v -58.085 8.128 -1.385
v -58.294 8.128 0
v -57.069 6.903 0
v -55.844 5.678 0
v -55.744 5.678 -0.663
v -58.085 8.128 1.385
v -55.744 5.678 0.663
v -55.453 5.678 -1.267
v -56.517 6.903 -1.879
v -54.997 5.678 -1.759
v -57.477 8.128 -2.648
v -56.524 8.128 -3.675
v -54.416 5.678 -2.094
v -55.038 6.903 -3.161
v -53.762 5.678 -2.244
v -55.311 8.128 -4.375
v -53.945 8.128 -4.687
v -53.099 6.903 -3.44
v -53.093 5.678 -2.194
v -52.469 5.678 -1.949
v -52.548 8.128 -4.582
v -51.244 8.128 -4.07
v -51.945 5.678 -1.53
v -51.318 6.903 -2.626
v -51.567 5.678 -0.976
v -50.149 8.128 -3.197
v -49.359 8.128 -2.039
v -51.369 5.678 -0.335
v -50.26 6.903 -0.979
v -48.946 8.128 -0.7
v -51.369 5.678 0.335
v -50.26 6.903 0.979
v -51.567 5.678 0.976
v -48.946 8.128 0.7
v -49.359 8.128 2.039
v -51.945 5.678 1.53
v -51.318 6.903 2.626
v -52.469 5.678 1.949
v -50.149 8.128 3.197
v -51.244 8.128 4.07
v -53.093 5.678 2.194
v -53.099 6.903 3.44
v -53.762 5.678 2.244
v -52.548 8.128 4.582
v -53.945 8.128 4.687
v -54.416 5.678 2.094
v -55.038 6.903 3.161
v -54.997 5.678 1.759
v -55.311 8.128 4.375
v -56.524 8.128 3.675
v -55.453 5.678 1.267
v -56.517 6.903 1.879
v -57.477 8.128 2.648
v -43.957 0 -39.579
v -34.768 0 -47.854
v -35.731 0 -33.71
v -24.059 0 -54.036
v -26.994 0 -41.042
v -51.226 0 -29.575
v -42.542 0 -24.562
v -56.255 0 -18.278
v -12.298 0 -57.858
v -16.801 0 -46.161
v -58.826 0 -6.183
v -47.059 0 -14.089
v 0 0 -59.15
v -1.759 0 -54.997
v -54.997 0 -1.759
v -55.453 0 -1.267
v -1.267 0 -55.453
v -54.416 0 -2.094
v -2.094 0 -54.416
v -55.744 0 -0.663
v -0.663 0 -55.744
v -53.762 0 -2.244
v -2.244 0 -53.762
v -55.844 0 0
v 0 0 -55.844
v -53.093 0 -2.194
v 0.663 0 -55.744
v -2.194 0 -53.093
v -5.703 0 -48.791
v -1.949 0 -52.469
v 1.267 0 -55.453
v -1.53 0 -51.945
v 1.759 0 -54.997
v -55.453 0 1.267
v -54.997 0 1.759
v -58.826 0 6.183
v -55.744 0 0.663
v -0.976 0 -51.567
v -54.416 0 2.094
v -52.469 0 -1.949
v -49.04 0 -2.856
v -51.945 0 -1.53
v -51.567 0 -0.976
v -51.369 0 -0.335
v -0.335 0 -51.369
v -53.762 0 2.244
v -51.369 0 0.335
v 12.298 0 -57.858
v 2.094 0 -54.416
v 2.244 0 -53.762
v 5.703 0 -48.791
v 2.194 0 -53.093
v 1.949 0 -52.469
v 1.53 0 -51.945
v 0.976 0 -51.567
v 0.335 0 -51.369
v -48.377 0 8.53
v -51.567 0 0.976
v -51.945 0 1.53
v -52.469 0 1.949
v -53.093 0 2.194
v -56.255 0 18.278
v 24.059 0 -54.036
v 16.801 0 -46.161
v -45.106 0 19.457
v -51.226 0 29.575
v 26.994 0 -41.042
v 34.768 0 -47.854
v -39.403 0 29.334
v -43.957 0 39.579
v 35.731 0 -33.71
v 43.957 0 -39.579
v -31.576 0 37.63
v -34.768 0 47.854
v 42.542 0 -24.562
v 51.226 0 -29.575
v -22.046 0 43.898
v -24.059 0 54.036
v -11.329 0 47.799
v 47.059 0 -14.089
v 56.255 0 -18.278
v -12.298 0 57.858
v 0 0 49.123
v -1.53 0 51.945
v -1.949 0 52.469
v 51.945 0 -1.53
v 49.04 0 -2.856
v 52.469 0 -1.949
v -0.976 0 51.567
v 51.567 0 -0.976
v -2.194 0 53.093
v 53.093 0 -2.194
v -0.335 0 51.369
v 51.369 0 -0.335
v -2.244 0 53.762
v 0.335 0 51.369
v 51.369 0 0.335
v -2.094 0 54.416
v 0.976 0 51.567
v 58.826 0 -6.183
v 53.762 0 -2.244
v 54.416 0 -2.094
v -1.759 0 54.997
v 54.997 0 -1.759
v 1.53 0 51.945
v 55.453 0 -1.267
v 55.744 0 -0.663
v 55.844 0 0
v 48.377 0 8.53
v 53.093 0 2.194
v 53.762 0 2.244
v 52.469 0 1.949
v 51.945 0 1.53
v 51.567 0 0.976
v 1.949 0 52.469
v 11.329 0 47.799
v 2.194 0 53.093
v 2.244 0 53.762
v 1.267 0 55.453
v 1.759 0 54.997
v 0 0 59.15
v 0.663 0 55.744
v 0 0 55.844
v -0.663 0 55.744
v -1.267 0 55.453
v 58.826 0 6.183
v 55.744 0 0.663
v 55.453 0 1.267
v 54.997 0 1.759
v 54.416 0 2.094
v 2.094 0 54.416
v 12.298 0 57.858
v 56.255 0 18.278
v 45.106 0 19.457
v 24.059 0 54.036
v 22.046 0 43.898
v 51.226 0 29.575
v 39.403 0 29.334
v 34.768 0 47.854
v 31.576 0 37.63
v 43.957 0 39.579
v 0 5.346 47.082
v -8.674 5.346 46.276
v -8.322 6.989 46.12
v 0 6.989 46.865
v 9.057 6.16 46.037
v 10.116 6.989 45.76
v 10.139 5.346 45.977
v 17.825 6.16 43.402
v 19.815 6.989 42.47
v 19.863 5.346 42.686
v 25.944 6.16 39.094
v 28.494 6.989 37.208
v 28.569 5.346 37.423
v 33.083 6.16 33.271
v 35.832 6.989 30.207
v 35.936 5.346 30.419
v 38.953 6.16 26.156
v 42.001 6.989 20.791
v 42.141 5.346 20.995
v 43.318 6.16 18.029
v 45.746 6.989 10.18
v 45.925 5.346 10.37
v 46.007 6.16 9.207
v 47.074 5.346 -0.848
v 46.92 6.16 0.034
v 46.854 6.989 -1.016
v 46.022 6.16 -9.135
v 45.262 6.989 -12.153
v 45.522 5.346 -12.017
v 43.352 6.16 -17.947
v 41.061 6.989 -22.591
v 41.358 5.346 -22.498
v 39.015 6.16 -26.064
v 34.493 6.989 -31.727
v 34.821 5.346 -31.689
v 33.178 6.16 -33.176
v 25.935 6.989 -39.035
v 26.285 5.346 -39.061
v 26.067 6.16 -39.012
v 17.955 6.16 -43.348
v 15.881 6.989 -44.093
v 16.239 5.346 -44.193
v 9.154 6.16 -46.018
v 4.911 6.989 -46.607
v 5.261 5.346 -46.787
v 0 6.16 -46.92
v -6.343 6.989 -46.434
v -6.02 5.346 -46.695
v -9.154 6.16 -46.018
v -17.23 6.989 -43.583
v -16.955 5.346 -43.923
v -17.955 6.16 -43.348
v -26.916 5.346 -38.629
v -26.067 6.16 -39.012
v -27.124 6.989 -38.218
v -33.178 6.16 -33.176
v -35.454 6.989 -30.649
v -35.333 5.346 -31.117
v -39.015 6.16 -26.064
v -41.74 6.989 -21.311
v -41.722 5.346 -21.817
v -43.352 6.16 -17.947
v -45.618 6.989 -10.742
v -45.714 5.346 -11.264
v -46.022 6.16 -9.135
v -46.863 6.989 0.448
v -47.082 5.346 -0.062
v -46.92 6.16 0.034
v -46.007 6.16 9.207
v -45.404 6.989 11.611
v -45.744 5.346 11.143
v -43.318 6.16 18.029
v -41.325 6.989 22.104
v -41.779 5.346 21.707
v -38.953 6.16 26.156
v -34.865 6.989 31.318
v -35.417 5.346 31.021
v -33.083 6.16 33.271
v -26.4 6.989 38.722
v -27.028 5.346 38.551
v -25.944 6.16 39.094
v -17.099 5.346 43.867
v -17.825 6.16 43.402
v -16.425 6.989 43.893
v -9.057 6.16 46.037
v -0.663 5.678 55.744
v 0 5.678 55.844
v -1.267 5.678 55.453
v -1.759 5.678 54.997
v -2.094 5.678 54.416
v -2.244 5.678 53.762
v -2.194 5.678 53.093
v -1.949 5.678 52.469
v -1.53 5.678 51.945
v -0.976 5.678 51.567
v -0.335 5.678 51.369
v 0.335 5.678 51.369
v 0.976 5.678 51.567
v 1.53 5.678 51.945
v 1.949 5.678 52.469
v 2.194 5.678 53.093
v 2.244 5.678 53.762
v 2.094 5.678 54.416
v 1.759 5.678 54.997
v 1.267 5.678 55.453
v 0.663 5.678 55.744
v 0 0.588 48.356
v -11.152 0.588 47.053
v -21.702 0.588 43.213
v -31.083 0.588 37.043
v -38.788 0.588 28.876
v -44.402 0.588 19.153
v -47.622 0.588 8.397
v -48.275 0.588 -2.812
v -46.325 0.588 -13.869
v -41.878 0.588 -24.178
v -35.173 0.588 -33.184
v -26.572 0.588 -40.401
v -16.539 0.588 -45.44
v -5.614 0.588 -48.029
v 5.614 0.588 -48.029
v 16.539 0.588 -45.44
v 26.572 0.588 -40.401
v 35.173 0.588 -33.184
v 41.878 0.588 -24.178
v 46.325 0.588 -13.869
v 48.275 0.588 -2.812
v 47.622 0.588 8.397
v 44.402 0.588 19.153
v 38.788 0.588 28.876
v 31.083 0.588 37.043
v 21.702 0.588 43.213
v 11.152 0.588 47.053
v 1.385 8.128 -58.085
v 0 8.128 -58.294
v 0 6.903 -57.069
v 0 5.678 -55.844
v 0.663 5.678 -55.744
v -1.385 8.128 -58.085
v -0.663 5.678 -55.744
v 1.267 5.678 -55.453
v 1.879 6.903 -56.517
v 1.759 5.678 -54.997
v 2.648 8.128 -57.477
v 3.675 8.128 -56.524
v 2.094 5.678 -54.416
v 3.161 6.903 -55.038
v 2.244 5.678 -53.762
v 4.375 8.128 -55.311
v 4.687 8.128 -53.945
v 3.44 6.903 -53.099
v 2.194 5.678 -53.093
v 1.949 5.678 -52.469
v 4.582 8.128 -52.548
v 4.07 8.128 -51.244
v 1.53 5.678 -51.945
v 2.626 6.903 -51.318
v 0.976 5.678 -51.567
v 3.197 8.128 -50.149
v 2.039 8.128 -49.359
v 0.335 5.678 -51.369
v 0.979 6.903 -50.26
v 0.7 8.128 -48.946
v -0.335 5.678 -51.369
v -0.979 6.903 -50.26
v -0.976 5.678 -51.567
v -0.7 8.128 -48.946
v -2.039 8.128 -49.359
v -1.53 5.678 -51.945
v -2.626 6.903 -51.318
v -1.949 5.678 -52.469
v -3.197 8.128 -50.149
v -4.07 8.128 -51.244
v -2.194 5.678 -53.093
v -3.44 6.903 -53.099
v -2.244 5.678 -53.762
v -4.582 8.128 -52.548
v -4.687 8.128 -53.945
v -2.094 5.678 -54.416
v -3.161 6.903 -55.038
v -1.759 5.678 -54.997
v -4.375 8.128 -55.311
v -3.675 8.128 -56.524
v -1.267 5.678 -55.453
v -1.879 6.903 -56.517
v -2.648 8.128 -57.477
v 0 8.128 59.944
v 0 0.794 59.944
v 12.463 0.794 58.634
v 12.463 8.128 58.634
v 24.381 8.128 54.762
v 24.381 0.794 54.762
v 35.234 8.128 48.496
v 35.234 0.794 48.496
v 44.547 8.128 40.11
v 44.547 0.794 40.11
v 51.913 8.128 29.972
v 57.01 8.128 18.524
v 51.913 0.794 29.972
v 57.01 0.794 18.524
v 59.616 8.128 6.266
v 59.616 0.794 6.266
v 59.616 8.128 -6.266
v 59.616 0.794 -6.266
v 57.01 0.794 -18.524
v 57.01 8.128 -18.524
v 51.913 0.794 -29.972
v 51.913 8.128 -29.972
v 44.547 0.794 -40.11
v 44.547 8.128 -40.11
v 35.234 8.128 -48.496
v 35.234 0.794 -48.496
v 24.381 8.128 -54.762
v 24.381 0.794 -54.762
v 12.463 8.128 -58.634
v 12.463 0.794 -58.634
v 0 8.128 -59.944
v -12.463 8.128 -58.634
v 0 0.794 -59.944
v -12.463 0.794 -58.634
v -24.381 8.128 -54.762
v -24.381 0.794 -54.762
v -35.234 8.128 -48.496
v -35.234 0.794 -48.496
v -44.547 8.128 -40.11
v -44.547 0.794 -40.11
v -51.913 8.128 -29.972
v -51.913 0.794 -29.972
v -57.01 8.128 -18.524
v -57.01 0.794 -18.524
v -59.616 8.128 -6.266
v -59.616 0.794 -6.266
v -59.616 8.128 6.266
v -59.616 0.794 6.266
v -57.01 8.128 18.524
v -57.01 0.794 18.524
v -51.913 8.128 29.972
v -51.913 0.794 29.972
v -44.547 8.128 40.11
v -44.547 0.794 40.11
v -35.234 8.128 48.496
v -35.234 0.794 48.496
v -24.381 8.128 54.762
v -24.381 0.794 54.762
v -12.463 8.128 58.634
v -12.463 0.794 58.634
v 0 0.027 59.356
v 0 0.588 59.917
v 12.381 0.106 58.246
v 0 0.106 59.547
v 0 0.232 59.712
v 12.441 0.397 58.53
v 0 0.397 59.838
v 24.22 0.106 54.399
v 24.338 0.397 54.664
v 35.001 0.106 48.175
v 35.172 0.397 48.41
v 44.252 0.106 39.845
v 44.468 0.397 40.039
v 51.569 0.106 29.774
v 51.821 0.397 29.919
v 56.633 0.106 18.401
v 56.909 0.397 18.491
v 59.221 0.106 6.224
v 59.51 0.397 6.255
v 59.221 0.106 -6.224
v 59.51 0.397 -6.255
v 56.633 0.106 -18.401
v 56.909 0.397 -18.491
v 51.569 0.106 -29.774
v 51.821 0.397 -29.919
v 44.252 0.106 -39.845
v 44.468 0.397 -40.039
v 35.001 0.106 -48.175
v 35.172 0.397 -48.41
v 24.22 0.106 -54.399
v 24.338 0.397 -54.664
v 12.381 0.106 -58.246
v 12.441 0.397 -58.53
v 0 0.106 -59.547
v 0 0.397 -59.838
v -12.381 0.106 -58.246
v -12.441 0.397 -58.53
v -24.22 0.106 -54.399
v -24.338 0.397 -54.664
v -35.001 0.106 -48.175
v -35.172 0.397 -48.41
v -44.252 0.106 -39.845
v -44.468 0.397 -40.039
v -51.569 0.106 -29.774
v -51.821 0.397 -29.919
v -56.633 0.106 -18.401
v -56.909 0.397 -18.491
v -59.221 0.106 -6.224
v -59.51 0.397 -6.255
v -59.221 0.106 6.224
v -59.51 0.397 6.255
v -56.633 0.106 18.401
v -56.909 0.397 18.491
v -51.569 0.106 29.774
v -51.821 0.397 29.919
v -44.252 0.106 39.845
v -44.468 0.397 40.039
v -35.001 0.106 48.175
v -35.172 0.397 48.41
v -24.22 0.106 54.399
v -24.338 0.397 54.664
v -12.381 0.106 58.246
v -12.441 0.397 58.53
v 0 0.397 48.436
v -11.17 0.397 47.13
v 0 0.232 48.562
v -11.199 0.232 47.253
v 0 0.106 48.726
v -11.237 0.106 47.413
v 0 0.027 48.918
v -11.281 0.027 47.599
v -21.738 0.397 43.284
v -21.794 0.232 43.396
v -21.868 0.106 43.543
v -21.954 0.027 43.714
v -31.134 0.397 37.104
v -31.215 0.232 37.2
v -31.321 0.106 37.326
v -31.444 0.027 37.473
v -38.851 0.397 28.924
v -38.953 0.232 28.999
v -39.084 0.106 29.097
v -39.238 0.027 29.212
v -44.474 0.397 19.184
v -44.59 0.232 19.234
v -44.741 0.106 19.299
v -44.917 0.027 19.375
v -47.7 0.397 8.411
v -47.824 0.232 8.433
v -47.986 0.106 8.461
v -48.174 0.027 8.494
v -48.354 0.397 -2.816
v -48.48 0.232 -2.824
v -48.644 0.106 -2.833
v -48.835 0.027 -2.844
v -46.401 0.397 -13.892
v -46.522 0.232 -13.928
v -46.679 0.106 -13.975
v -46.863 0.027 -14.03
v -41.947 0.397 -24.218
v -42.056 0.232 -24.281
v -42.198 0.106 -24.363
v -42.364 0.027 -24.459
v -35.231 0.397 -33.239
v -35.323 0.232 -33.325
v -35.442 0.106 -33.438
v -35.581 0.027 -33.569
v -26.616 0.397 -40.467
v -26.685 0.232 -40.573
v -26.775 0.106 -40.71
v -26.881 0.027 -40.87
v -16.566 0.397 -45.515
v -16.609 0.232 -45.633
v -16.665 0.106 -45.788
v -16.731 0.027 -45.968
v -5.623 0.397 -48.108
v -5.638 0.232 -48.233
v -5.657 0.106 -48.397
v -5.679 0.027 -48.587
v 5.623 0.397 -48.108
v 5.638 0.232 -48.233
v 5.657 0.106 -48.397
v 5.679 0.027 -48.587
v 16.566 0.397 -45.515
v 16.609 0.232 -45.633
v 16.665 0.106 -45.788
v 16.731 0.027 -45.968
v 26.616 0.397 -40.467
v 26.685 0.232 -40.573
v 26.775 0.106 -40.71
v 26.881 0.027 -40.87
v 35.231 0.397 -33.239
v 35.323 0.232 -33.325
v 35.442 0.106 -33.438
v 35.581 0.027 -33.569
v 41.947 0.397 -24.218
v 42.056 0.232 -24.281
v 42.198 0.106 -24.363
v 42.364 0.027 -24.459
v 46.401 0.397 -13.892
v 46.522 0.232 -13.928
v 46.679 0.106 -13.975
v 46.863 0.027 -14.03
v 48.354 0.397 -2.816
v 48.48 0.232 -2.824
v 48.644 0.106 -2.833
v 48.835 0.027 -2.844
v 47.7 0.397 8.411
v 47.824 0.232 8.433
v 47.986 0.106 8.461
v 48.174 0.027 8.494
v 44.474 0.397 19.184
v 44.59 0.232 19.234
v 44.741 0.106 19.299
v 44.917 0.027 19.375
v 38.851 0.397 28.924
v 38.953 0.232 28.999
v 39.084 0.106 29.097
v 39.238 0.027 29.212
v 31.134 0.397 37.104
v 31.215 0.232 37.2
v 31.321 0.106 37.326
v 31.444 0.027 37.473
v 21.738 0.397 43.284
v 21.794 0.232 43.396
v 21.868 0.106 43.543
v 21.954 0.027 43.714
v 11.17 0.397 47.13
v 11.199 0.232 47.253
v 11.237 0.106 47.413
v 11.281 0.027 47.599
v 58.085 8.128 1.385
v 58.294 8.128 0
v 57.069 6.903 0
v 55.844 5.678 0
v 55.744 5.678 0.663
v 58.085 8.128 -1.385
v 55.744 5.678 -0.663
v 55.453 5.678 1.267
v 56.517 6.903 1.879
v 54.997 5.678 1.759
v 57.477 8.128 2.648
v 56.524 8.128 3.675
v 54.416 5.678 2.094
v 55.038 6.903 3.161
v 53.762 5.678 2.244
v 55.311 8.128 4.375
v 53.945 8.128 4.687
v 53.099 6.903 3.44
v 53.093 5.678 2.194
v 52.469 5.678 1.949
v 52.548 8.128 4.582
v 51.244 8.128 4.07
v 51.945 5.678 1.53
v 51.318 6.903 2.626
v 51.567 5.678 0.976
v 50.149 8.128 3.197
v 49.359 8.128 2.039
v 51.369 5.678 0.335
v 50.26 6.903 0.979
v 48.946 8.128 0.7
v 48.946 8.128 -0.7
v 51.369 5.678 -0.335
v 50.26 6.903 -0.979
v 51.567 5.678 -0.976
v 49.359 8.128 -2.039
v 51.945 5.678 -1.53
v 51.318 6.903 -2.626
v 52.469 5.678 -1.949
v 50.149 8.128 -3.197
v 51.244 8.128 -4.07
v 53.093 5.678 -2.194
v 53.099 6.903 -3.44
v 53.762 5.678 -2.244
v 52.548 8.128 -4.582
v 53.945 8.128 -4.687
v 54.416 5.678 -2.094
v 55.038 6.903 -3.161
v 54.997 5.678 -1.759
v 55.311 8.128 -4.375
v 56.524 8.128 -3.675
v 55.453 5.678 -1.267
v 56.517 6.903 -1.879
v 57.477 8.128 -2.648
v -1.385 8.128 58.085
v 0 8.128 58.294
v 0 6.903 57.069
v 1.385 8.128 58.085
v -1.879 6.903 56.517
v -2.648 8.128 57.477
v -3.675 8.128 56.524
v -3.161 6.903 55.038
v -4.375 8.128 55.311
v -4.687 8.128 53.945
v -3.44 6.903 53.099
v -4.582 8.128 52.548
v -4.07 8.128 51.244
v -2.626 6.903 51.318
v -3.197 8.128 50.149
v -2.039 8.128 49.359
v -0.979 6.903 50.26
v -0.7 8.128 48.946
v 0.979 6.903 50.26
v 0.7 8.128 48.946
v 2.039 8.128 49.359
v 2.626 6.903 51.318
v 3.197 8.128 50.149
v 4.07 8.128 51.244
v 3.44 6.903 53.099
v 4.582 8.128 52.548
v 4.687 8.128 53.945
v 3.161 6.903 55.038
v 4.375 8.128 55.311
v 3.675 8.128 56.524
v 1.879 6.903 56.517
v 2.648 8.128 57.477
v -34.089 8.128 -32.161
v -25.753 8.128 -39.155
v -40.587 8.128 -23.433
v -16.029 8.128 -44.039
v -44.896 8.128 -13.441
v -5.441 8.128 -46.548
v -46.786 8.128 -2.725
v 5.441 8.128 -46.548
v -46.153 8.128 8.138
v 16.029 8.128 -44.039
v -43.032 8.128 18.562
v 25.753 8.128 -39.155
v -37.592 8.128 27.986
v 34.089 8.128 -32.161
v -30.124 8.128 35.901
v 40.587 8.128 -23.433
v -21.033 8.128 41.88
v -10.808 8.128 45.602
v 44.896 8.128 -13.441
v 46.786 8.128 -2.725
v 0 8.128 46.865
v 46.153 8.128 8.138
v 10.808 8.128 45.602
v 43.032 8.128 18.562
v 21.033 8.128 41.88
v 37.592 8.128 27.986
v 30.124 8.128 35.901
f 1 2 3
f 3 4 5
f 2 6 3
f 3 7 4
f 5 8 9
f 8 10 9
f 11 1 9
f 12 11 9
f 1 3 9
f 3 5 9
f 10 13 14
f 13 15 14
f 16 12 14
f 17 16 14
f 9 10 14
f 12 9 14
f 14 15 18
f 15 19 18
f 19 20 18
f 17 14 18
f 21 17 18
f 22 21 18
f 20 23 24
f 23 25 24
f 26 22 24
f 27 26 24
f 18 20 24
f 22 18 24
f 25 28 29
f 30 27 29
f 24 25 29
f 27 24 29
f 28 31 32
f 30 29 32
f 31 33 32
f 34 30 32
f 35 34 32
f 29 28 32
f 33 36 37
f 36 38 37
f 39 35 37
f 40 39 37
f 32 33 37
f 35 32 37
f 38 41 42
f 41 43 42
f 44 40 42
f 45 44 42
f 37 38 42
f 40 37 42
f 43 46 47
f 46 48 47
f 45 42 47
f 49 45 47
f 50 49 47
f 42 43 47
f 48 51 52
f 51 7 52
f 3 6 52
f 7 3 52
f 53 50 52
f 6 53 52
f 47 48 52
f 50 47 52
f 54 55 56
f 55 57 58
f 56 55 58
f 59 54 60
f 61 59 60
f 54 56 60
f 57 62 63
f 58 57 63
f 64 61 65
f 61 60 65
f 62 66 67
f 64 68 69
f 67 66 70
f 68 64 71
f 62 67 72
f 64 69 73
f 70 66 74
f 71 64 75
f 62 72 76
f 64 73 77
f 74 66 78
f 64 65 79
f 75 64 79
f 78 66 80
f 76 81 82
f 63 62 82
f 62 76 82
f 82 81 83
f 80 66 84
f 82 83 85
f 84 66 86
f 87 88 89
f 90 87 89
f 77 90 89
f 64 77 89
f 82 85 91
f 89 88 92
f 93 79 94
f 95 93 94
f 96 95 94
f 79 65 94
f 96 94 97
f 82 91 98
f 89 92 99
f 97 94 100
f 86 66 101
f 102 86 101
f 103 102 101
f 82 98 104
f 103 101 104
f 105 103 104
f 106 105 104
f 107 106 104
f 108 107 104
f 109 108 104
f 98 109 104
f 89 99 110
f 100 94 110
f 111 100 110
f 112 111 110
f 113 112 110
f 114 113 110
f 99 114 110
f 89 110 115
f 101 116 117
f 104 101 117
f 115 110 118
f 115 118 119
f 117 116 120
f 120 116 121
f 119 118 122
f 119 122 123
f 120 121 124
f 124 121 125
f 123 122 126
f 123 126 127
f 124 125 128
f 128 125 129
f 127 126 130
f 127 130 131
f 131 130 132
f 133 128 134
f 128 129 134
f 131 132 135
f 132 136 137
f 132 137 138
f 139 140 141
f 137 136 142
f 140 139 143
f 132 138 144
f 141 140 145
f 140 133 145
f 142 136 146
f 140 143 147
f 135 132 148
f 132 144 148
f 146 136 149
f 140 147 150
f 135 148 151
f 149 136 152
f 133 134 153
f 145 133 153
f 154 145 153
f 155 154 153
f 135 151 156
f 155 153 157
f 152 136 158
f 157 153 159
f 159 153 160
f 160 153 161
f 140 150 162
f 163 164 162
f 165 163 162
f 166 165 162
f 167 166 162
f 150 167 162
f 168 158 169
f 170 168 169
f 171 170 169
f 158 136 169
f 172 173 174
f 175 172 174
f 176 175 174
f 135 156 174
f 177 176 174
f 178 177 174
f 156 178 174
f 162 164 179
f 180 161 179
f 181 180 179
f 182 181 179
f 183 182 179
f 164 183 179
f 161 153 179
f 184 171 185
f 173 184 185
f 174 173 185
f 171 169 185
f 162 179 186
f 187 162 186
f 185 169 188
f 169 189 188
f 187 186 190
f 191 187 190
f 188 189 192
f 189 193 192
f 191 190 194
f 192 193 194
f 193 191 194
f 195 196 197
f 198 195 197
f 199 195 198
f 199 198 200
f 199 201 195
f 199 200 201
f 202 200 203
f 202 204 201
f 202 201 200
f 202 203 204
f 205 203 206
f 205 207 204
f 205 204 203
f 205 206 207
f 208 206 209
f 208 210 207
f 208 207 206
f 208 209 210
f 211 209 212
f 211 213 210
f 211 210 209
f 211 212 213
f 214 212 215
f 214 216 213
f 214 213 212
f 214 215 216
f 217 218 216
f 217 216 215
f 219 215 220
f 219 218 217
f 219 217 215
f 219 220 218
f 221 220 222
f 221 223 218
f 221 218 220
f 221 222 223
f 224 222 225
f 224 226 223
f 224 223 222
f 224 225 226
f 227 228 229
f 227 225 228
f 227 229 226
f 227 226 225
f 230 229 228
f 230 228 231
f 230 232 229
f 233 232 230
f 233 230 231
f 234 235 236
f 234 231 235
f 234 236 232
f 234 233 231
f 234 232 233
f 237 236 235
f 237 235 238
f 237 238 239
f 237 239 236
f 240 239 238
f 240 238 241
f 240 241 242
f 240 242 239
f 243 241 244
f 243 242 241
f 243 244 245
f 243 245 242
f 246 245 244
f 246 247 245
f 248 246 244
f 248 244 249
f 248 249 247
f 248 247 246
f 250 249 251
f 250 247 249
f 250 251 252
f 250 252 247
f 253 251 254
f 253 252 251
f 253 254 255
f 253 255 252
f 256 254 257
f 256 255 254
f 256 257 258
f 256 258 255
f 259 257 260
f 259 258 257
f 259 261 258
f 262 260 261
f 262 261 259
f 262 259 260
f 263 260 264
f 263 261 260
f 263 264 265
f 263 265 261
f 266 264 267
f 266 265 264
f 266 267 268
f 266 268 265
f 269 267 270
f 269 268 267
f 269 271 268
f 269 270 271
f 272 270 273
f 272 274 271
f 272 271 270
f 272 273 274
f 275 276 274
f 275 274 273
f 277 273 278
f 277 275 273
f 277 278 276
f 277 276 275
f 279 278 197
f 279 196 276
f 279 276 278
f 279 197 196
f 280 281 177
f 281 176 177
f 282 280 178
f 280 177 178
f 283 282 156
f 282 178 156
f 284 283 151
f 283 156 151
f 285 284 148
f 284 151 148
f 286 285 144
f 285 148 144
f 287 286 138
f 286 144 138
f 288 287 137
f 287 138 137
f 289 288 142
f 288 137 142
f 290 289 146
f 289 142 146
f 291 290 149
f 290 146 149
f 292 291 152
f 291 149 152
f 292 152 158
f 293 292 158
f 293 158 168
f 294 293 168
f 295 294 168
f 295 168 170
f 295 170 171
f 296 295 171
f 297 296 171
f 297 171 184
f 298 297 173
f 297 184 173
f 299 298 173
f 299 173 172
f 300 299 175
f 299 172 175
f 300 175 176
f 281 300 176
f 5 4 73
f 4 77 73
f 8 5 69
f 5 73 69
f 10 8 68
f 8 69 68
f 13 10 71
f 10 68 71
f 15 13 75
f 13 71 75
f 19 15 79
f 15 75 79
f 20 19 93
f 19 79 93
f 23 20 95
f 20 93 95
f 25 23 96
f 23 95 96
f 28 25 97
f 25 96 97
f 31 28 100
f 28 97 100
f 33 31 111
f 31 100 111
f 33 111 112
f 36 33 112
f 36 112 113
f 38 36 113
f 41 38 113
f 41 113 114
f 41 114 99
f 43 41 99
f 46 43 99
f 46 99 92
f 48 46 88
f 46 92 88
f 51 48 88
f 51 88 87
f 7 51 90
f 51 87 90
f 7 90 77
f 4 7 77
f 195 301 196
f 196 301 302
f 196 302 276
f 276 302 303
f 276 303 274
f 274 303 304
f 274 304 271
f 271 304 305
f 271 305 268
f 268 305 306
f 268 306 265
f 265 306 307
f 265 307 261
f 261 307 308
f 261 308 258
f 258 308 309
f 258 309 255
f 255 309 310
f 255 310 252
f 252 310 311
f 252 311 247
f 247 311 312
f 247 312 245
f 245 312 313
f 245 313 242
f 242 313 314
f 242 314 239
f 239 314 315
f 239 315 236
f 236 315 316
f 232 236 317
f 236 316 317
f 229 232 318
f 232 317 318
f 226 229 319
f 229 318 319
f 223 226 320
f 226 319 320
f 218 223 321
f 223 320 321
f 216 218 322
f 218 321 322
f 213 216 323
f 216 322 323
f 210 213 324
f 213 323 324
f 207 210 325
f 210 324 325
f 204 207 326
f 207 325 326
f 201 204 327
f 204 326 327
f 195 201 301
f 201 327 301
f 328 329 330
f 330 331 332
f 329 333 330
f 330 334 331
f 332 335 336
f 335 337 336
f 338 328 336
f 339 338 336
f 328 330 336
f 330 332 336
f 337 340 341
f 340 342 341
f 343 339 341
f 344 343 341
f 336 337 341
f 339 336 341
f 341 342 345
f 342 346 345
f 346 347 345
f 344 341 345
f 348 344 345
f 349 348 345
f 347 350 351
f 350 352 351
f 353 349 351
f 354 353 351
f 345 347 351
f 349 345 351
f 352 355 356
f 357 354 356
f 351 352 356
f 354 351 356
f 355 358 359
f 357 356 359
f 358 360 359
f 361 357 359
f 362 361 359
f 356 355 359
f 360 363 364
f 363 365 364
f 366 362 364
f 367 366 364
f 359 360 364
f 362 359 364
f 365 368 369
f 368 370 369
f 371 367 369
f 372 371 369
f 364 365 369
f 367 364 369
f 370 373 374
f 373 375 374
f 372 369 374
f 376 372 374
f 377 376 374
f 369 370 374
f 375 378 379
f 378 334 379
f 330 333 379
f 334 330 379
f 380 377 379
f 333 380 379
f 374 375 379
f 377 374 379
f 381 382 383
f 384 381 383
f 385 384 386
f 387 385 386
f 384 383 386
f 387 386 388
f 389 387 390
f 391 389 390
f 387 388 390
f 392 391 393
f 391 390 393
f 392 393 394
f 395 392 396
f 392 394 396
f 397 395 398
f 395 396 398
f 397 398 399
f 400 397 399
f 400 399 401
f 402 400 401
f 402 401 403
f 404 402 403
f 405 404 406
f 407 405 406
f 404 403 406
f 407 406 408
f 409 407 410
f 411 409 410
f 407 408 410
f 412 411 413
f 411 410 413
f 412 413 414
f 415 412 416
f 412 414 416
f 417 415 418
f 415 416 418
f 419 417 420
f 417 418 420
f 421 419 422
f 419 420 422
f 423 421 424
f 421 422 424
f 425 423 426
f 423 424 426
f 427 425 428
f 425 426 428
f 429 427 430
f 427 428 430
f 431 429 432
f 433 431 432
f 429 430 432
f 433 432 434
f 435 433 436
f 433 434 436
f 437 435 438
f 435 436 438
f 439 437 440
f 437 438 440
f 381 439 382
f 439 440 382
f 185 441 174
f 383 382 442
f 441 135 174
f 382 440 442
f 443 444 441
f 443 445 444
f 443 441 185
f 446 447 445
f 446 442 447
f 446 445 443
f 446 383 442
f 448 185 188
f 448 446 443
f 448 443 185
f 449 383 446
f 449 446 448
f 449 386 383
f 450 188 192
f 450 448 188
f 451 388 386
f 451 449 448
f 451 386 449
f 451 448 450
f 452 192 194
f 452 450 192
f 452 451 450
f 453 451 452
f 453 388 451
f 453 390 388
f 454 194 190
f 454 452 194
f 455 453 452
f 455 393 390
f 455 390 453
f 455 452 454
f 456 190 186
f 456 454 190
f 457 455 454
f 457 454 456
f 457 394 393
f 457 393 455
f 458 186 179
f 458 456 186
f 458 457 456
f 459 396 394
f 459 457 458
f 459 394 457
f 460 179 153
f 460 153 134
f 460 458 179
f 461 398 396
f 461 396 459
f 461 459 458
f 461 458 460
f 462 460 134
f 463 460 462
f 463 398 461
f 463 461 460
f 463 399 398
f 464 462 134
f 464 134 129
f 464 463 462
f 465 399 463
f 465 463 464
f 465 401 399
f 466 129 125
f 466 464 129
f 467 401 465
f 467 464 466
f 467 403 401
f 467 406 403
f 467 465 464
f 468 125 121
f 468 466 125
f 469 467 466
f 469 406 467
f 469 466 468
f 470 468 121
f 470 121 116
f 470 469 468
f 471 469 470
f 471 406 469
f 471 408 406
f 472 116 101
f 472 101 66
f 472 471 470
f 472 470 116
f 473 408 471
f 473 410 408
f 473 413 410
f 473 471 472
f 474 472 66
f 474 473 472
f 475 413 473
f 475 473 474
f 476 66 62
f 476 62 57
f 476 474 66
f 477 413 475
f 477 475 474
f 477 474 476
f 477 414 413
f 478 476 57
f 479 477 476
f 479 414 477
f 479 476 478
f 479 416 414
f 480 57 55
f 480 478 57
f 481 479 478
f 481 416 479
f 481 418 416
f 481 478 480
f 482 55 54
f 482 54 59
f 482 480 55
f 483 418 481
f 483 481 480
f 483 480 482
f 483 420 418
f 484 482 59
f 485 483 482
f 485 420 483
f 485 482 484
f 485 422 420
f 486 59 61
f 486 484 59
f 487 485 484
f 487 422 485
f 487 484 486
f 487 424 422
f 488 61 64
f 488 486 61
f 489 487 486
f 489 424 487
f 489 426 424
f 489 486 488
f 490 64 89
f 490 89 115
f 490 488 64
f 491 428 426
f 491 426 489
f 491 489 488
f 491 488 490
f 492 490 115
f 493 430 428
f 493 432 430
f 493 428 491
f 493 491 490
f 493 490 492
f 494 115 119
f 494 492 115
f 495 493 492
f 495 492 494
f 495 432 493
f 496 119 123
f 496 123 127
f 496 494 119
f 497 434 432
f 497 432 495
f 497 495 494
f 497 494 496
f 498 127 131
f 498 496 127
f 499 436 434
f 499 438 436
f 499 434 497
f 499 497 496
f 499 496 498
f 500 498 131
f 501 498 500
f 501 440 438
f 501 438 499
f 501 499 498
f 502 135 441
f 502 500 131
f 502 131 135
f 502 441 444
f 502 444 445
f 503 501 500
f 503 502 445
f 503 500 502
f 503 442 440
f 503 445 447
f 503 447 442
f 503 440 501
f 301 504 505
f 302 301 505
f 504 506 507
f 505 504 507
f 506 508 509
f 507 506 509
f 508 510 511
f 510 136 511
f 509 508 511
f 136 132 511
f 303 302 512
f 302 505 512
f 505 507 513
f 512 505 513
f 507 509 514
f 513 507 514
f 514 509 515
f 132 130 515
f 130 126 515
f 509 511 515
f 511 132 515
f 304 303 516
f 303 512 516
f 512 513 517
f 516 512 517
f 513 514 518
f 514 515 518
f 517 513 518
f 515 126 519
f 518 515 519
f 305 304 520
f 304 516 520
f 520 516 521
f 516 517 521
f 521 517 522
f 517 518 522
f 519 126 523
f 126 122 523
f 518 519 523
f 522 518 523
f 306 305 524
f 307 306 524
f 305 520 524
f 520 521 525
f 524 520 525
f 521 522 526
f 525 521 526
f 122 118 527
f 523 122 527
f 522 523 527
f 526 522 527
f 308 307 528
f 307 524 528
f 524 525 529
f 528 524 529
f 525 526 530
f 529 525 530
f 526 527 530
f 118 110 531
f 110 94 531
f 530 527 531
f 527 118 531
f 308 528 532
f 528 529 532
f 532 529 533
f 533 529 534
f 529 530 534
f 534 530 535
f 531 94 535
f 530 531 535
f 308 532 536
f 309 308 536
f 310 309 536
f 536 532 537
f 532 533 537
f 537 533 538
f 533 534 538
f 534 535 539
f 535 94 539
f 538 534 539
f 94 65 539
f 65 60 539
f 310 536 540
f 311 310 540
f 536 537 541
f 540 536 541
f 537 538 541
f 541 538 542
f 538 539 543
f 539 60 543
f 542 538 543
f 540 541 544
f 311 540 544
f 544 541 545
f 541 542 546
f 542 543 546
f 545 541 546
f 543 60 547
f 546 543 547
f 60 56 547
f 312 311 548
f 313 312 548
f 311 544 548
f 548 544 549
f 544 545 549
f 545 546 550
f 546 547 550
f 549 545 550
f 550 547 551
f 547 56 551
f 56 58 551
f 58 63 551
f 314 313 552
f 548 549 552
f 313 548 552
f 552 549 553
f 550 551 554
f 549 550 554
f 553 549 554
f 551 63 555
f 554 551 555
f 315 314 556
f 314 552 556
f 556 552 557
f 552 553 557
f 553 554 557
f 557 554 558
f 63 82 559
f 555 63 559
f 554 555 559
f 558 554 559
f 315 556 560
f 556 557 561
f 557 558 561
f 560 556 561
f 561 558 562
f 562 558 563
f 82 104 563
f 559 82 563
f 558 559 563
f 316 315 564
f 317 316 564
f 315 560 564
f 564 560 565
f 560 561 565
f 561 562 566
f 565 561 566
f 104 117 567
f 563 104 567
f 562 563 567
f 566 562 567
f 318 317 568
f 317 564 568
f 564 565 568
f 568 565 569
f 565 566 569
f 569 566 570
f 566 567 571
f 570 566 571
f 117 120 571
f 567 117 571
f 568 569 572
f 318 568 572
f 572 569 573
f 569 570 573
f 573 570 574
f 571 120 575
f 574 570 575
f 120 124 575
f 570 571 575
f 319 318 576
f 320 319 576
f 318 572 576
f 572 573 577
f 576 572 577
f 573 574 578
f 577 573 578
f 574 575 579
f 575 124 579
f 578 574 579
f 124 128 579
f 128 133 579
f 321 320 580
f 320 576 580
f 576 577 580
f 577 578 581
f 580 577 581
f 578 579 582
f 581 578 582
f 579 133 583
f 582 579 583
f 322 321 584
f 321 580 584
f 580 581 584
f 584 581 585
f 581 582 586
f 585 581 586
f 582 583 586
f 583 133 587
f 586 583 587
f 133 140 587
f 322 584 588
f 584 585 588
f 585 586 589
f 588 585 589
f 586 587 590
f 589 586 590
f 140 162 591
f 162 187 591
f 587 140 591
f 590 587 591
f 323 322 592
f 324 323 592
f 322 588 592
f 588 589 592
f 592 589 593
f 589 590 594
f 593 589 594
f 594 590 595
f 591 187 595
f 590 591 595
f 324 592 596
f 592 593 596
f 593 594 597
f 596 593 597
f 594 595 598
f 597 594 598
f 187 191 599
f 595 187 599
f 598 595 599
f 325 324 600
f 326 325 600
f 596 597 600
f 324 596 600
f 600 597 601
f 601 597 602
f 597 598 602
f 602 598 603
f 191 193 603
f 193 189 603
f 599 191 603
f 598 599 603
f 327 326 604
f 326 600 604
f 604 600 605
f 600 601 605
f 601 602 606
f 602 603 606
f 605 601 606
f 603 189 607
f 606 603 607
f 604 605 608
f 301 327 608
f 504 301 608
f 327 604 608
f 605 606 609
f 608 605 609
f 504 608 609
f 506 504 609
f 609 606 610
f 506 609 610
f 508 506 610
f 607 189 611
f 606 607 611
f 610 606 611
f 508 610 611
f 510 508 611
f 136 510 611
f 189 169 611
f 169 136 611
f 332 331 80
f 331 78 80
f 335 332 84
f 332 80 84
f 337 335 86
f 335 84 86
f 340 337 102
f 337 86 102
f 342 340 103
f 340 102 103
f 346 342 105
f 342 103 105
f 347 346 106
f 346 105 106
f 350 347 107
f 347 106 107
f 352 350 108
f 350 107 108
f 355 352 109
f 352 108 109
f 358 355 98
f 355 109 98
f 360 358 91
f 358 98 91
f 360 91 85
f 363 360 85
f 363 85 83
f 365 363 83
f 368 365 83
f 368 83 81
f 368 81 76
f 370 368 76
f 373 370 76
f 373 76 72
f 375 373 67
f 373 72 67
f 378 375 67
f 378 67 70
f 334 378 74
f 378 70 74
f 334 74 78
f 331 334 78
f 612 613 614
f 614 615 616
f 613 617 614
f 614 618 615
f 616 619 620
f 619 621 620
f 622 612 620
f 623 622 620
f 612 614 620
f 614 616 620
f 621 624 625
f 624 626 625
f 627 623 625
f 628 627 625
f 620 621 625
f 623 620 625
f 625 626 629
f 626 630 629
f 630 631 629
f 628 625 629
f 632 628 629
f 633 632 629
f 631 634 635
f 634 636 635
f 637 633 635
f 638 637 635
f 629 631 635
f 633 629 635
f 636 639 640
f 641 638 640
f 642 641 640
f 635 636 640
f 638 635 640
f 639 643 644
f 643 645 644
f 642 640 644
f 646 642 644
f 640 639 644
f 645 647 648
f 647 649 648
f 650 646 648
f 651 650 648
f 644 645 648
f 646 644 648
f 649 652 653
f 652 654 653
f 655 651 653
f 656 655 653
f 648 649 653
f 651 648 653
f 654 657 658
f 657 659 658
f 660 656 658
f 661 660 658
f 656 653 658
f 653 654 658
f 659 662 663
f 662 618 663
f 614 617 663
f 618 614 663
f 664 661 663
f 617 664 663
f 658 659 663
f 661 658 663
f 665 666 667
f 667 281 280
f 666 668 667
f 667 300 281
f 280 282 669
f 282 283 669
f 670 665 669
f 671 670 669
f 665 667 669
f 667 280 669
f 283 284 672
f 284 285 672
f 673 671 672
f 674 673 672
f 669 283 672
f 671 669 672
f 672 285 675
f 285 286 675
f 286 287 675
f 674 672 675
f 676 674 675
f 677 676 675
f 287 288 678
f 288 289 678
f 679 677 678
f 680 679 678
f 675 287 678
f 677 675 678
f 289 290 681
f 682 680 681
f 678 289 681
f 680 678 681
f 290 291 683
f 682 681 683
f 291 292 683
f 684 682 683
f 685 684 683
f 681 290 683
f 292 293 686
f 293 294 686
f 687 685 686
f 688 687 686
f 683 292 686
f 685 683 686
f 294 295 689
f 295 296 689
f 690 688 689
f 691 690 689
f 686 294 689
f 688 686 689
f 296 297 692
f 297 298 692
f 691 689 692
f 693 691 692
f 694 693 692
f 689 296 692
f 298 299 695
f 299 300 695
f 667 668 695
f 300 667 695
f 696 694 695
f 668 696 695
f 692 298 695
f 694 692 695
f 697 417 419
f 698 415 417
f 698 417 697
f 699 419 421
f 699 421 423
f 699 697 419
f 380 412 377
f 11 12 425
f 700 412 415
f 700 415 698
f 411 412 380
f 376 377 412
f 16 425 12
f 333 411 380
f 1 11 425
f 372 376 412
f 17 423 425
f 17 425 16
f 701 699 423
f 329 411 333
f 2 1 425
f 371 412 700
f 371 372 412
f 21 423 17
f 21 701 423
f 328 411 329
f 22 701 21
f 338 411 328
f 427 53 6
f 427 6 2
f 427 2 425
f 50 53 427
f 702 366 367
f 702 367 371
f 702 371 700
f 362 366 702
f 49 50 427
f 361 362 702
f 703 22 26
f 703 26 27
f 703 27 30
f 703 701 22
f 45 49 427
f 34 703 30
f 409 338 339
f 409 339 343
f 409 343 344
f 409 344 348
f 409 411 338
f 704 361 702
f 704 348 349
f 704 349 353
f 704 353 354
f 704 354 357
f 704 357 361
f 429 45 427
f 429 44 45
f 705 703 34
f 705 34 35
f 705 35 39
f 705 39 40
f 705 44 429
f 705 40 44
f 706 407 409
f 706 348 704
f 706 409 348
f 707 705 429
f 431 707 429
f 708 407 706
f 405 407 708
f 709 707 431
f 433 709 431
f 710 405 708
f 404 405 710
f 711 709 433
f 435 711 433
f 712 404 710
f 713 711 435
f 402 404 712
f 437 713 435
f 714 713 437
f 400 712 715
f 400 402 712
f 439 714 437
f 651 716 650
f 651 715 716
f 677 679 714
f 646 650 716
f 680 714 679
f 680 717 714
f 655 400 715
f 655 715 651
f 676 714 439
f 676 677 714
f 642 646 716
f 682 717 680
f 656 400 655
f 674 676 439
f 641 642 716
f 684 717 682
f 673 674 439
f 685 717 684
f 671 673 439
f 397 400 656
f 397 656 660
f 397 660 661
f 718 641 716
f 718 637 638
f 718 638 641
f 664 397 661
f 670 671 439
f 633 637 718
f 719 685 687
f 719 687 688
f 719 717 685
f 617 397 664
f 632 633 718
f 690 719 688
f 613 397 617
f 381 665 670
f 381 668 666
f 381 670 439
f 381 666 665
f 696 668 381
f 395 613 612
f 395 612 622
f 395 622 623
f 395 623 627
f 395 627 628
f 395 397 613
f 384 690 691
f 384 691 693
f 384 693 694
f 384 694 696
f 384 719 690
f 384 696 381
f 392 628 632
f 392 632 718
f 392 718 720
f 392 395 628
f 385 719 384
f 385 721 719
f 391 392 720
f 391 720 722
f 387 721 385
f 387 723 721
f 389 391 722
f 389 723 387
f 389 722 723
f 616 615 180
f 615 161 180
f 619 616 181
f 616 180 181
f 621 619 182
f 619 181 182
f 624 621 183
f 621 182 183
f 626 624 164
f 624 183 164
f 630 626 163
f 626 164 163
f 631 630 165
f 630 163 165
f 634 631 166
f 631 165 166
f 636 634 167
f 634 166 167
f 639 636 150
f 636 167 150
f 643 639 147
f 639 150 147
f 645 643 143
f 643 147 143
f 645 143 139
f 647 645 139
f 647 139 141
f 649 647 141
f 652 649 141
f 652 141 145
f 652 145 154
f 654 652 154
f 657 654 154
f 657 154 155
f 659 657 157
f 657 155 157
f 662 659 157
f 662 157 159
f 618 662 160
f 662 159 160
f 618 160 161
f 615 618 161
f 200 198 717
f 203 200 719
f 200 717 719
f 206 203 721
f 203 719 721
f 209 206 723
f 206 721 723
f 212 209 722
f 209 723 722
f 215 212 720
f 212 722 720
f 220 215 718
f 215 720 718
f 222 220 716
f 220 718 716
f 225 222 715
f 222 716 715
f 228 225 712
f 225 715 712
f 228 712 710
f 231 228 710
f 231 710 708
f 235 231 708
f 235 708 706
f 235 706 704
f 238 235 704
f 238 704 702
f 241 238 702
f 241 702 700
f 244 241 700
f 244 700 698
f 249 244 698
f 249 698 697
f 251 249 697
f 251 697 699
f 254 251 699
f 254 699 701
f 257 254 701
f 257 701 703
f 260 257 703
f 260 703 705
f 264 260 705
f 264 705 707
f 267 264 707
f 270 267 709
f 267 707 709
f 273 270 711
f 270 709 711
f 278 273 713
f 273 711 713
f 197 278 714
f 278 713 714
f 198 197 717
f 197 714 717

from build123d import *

# Parameters (mm, degrees)
SKETCH1_R                                       = 59.944
SKETCH1_R_2                                     = 47.244
BOSS_EXTRUDE1_DEPTH                             = 8.128
CSK_FOR_M4_FLAT_HEAD_MACHINE_SCREW1_D           = 4.5
CSK_FOR_M4_FLAT_HEAD_MACHINE_SCREW1_CSINK_D     = 9.4
CSK_FOR_M4_FLAT_HEAD_MACHINE_SCREW1_CSINK_ANGLE = 90
CIRPATTERN1_COUNT                               = 4
DRAFT2_ANGLE                                    = 15
SKETCH5_R                                       = 46.865275631
CUT_EXTRUDE1_DEPTH                              = 86.162378173
FILLET1_R                                       = 6.35
FILLET2_R                                       = 0.79375


with BuildPart() as part:
    # Sketch1 → Boss-Extrude1 (new body)
    with BuildSketch(Plane(origin=(0, 0, 0), x_dir=(1, 0, 0), z_dir=(0, 1, 0))):
        with Locations(Location((0, 0, 0), (0, 0, 270))):
            Circle(SKETCH1_R)
        with Locations(Location((0, 0, 0), (0, 0, 270))):
            Circle(SKETCH1_R_2, mode=Mode.SUBTRACT)
    extrude(amount=BOSS_EXTRUDE1_DEPTH)

    # CSK for M4 Flat Head Machine Screw1 (through all)
    with Locations(Plane(origin=(0, 8.128, -53.594), x_dir=(0, 0, 1), z_dir=(0, 1, 0))):
        with Locations((0, 0)):
            csk_for_m4_flat_head_machine_screw1 = CounterSinkHole(CSK_FOR_M4_FLAT_HEAD_MACHINE_SCREW1_D / 2, CSK_FOR_M4_FLAT_HEAD_MACHINE_SCREW1_CSINK_D / 2, counter_sink_angle=CSK_FOR_M4_FLAT_HEAD_MACHINE_SCREW1_CSINK_ANGLE)

    # CirPattern1: CSK for M4 Flat Head Machine Screw1 ×4 about axis
    cirpattern1_axis = Axis((0, 0, 0), (0, 1, 0))
    for i in range(1, CIRPATTERN1_COUNT):
        add(csk_for_m4_flat_head_machine_screw1.rotate(cirpattern1_axis, i * 360 / CIRPATTERN1_COUNT), mode=Mode.SUBTRACT)

    # Draft2
    draft2_faces = [part.faces().sort_by_distance(p)[0] for p in [
        (0, 4.064, -47.244),
    ]]
    draft(draft2_faces, Plane(origin=(0, 0, 0), x_dir=(0, 0, -1), z_dir=(0, -1, 0)), DRAFT2_ANGLE)

    # Sketch4 → Cut-Revolve1 (revolve, cut)
    with BuildSketch(Plane(origin=(0, 0, 0), x_dir=(0, 0, -1), z_dir=(1, 0, 0)), mode=Mode.PRIVATE) as cut_revolve1_sk:
        Polygon((47.244, 0), (45.066108964, 8.128), (46.336108964, 8.128), (48.514, 0), align=None)
    revolve(cut_revolve1_sk.sketch.rotate(Axis((0, 8.128, 0), (0, -1, 0)), 180), axis=Axis((0, 8.128, 0), (0, -1, 0)), mode=Mode.SUBTRACT)

    # Sketch5 → Cut-Extrude1 (cut, through all)
    with BuildSketch(Plane(origin=(0, 8.128, 0), x_dir=(1, 0, 0), z_dir=(0, 1, 0))):
        with Locations(Location((0, 0, 0), (0, 0, 270))):
            Circle(SKETCH5_R)
    extrude(amount=-CUT_EXTRUDE1_DEPTH, mode=Mode.SUBTRACT)

    # Fillet1
    fillet1_edges = [part.edges().sort_by_distance(p)[0] for p in [
        (0, 6.153123114, -46.865275631),
    ]]
    fillet(fillet1_edges, radius=FILLET1_R)

    # Fillet2
    fillet2_edges = [part.edges().sort_by_distance(p)[0] for p in [
        (0, 0, -59.944),
        (0, 0, -48.514),
    ]]
    fillet(fillet2_edges, radius=FILLET2_R)


solid = part.part
